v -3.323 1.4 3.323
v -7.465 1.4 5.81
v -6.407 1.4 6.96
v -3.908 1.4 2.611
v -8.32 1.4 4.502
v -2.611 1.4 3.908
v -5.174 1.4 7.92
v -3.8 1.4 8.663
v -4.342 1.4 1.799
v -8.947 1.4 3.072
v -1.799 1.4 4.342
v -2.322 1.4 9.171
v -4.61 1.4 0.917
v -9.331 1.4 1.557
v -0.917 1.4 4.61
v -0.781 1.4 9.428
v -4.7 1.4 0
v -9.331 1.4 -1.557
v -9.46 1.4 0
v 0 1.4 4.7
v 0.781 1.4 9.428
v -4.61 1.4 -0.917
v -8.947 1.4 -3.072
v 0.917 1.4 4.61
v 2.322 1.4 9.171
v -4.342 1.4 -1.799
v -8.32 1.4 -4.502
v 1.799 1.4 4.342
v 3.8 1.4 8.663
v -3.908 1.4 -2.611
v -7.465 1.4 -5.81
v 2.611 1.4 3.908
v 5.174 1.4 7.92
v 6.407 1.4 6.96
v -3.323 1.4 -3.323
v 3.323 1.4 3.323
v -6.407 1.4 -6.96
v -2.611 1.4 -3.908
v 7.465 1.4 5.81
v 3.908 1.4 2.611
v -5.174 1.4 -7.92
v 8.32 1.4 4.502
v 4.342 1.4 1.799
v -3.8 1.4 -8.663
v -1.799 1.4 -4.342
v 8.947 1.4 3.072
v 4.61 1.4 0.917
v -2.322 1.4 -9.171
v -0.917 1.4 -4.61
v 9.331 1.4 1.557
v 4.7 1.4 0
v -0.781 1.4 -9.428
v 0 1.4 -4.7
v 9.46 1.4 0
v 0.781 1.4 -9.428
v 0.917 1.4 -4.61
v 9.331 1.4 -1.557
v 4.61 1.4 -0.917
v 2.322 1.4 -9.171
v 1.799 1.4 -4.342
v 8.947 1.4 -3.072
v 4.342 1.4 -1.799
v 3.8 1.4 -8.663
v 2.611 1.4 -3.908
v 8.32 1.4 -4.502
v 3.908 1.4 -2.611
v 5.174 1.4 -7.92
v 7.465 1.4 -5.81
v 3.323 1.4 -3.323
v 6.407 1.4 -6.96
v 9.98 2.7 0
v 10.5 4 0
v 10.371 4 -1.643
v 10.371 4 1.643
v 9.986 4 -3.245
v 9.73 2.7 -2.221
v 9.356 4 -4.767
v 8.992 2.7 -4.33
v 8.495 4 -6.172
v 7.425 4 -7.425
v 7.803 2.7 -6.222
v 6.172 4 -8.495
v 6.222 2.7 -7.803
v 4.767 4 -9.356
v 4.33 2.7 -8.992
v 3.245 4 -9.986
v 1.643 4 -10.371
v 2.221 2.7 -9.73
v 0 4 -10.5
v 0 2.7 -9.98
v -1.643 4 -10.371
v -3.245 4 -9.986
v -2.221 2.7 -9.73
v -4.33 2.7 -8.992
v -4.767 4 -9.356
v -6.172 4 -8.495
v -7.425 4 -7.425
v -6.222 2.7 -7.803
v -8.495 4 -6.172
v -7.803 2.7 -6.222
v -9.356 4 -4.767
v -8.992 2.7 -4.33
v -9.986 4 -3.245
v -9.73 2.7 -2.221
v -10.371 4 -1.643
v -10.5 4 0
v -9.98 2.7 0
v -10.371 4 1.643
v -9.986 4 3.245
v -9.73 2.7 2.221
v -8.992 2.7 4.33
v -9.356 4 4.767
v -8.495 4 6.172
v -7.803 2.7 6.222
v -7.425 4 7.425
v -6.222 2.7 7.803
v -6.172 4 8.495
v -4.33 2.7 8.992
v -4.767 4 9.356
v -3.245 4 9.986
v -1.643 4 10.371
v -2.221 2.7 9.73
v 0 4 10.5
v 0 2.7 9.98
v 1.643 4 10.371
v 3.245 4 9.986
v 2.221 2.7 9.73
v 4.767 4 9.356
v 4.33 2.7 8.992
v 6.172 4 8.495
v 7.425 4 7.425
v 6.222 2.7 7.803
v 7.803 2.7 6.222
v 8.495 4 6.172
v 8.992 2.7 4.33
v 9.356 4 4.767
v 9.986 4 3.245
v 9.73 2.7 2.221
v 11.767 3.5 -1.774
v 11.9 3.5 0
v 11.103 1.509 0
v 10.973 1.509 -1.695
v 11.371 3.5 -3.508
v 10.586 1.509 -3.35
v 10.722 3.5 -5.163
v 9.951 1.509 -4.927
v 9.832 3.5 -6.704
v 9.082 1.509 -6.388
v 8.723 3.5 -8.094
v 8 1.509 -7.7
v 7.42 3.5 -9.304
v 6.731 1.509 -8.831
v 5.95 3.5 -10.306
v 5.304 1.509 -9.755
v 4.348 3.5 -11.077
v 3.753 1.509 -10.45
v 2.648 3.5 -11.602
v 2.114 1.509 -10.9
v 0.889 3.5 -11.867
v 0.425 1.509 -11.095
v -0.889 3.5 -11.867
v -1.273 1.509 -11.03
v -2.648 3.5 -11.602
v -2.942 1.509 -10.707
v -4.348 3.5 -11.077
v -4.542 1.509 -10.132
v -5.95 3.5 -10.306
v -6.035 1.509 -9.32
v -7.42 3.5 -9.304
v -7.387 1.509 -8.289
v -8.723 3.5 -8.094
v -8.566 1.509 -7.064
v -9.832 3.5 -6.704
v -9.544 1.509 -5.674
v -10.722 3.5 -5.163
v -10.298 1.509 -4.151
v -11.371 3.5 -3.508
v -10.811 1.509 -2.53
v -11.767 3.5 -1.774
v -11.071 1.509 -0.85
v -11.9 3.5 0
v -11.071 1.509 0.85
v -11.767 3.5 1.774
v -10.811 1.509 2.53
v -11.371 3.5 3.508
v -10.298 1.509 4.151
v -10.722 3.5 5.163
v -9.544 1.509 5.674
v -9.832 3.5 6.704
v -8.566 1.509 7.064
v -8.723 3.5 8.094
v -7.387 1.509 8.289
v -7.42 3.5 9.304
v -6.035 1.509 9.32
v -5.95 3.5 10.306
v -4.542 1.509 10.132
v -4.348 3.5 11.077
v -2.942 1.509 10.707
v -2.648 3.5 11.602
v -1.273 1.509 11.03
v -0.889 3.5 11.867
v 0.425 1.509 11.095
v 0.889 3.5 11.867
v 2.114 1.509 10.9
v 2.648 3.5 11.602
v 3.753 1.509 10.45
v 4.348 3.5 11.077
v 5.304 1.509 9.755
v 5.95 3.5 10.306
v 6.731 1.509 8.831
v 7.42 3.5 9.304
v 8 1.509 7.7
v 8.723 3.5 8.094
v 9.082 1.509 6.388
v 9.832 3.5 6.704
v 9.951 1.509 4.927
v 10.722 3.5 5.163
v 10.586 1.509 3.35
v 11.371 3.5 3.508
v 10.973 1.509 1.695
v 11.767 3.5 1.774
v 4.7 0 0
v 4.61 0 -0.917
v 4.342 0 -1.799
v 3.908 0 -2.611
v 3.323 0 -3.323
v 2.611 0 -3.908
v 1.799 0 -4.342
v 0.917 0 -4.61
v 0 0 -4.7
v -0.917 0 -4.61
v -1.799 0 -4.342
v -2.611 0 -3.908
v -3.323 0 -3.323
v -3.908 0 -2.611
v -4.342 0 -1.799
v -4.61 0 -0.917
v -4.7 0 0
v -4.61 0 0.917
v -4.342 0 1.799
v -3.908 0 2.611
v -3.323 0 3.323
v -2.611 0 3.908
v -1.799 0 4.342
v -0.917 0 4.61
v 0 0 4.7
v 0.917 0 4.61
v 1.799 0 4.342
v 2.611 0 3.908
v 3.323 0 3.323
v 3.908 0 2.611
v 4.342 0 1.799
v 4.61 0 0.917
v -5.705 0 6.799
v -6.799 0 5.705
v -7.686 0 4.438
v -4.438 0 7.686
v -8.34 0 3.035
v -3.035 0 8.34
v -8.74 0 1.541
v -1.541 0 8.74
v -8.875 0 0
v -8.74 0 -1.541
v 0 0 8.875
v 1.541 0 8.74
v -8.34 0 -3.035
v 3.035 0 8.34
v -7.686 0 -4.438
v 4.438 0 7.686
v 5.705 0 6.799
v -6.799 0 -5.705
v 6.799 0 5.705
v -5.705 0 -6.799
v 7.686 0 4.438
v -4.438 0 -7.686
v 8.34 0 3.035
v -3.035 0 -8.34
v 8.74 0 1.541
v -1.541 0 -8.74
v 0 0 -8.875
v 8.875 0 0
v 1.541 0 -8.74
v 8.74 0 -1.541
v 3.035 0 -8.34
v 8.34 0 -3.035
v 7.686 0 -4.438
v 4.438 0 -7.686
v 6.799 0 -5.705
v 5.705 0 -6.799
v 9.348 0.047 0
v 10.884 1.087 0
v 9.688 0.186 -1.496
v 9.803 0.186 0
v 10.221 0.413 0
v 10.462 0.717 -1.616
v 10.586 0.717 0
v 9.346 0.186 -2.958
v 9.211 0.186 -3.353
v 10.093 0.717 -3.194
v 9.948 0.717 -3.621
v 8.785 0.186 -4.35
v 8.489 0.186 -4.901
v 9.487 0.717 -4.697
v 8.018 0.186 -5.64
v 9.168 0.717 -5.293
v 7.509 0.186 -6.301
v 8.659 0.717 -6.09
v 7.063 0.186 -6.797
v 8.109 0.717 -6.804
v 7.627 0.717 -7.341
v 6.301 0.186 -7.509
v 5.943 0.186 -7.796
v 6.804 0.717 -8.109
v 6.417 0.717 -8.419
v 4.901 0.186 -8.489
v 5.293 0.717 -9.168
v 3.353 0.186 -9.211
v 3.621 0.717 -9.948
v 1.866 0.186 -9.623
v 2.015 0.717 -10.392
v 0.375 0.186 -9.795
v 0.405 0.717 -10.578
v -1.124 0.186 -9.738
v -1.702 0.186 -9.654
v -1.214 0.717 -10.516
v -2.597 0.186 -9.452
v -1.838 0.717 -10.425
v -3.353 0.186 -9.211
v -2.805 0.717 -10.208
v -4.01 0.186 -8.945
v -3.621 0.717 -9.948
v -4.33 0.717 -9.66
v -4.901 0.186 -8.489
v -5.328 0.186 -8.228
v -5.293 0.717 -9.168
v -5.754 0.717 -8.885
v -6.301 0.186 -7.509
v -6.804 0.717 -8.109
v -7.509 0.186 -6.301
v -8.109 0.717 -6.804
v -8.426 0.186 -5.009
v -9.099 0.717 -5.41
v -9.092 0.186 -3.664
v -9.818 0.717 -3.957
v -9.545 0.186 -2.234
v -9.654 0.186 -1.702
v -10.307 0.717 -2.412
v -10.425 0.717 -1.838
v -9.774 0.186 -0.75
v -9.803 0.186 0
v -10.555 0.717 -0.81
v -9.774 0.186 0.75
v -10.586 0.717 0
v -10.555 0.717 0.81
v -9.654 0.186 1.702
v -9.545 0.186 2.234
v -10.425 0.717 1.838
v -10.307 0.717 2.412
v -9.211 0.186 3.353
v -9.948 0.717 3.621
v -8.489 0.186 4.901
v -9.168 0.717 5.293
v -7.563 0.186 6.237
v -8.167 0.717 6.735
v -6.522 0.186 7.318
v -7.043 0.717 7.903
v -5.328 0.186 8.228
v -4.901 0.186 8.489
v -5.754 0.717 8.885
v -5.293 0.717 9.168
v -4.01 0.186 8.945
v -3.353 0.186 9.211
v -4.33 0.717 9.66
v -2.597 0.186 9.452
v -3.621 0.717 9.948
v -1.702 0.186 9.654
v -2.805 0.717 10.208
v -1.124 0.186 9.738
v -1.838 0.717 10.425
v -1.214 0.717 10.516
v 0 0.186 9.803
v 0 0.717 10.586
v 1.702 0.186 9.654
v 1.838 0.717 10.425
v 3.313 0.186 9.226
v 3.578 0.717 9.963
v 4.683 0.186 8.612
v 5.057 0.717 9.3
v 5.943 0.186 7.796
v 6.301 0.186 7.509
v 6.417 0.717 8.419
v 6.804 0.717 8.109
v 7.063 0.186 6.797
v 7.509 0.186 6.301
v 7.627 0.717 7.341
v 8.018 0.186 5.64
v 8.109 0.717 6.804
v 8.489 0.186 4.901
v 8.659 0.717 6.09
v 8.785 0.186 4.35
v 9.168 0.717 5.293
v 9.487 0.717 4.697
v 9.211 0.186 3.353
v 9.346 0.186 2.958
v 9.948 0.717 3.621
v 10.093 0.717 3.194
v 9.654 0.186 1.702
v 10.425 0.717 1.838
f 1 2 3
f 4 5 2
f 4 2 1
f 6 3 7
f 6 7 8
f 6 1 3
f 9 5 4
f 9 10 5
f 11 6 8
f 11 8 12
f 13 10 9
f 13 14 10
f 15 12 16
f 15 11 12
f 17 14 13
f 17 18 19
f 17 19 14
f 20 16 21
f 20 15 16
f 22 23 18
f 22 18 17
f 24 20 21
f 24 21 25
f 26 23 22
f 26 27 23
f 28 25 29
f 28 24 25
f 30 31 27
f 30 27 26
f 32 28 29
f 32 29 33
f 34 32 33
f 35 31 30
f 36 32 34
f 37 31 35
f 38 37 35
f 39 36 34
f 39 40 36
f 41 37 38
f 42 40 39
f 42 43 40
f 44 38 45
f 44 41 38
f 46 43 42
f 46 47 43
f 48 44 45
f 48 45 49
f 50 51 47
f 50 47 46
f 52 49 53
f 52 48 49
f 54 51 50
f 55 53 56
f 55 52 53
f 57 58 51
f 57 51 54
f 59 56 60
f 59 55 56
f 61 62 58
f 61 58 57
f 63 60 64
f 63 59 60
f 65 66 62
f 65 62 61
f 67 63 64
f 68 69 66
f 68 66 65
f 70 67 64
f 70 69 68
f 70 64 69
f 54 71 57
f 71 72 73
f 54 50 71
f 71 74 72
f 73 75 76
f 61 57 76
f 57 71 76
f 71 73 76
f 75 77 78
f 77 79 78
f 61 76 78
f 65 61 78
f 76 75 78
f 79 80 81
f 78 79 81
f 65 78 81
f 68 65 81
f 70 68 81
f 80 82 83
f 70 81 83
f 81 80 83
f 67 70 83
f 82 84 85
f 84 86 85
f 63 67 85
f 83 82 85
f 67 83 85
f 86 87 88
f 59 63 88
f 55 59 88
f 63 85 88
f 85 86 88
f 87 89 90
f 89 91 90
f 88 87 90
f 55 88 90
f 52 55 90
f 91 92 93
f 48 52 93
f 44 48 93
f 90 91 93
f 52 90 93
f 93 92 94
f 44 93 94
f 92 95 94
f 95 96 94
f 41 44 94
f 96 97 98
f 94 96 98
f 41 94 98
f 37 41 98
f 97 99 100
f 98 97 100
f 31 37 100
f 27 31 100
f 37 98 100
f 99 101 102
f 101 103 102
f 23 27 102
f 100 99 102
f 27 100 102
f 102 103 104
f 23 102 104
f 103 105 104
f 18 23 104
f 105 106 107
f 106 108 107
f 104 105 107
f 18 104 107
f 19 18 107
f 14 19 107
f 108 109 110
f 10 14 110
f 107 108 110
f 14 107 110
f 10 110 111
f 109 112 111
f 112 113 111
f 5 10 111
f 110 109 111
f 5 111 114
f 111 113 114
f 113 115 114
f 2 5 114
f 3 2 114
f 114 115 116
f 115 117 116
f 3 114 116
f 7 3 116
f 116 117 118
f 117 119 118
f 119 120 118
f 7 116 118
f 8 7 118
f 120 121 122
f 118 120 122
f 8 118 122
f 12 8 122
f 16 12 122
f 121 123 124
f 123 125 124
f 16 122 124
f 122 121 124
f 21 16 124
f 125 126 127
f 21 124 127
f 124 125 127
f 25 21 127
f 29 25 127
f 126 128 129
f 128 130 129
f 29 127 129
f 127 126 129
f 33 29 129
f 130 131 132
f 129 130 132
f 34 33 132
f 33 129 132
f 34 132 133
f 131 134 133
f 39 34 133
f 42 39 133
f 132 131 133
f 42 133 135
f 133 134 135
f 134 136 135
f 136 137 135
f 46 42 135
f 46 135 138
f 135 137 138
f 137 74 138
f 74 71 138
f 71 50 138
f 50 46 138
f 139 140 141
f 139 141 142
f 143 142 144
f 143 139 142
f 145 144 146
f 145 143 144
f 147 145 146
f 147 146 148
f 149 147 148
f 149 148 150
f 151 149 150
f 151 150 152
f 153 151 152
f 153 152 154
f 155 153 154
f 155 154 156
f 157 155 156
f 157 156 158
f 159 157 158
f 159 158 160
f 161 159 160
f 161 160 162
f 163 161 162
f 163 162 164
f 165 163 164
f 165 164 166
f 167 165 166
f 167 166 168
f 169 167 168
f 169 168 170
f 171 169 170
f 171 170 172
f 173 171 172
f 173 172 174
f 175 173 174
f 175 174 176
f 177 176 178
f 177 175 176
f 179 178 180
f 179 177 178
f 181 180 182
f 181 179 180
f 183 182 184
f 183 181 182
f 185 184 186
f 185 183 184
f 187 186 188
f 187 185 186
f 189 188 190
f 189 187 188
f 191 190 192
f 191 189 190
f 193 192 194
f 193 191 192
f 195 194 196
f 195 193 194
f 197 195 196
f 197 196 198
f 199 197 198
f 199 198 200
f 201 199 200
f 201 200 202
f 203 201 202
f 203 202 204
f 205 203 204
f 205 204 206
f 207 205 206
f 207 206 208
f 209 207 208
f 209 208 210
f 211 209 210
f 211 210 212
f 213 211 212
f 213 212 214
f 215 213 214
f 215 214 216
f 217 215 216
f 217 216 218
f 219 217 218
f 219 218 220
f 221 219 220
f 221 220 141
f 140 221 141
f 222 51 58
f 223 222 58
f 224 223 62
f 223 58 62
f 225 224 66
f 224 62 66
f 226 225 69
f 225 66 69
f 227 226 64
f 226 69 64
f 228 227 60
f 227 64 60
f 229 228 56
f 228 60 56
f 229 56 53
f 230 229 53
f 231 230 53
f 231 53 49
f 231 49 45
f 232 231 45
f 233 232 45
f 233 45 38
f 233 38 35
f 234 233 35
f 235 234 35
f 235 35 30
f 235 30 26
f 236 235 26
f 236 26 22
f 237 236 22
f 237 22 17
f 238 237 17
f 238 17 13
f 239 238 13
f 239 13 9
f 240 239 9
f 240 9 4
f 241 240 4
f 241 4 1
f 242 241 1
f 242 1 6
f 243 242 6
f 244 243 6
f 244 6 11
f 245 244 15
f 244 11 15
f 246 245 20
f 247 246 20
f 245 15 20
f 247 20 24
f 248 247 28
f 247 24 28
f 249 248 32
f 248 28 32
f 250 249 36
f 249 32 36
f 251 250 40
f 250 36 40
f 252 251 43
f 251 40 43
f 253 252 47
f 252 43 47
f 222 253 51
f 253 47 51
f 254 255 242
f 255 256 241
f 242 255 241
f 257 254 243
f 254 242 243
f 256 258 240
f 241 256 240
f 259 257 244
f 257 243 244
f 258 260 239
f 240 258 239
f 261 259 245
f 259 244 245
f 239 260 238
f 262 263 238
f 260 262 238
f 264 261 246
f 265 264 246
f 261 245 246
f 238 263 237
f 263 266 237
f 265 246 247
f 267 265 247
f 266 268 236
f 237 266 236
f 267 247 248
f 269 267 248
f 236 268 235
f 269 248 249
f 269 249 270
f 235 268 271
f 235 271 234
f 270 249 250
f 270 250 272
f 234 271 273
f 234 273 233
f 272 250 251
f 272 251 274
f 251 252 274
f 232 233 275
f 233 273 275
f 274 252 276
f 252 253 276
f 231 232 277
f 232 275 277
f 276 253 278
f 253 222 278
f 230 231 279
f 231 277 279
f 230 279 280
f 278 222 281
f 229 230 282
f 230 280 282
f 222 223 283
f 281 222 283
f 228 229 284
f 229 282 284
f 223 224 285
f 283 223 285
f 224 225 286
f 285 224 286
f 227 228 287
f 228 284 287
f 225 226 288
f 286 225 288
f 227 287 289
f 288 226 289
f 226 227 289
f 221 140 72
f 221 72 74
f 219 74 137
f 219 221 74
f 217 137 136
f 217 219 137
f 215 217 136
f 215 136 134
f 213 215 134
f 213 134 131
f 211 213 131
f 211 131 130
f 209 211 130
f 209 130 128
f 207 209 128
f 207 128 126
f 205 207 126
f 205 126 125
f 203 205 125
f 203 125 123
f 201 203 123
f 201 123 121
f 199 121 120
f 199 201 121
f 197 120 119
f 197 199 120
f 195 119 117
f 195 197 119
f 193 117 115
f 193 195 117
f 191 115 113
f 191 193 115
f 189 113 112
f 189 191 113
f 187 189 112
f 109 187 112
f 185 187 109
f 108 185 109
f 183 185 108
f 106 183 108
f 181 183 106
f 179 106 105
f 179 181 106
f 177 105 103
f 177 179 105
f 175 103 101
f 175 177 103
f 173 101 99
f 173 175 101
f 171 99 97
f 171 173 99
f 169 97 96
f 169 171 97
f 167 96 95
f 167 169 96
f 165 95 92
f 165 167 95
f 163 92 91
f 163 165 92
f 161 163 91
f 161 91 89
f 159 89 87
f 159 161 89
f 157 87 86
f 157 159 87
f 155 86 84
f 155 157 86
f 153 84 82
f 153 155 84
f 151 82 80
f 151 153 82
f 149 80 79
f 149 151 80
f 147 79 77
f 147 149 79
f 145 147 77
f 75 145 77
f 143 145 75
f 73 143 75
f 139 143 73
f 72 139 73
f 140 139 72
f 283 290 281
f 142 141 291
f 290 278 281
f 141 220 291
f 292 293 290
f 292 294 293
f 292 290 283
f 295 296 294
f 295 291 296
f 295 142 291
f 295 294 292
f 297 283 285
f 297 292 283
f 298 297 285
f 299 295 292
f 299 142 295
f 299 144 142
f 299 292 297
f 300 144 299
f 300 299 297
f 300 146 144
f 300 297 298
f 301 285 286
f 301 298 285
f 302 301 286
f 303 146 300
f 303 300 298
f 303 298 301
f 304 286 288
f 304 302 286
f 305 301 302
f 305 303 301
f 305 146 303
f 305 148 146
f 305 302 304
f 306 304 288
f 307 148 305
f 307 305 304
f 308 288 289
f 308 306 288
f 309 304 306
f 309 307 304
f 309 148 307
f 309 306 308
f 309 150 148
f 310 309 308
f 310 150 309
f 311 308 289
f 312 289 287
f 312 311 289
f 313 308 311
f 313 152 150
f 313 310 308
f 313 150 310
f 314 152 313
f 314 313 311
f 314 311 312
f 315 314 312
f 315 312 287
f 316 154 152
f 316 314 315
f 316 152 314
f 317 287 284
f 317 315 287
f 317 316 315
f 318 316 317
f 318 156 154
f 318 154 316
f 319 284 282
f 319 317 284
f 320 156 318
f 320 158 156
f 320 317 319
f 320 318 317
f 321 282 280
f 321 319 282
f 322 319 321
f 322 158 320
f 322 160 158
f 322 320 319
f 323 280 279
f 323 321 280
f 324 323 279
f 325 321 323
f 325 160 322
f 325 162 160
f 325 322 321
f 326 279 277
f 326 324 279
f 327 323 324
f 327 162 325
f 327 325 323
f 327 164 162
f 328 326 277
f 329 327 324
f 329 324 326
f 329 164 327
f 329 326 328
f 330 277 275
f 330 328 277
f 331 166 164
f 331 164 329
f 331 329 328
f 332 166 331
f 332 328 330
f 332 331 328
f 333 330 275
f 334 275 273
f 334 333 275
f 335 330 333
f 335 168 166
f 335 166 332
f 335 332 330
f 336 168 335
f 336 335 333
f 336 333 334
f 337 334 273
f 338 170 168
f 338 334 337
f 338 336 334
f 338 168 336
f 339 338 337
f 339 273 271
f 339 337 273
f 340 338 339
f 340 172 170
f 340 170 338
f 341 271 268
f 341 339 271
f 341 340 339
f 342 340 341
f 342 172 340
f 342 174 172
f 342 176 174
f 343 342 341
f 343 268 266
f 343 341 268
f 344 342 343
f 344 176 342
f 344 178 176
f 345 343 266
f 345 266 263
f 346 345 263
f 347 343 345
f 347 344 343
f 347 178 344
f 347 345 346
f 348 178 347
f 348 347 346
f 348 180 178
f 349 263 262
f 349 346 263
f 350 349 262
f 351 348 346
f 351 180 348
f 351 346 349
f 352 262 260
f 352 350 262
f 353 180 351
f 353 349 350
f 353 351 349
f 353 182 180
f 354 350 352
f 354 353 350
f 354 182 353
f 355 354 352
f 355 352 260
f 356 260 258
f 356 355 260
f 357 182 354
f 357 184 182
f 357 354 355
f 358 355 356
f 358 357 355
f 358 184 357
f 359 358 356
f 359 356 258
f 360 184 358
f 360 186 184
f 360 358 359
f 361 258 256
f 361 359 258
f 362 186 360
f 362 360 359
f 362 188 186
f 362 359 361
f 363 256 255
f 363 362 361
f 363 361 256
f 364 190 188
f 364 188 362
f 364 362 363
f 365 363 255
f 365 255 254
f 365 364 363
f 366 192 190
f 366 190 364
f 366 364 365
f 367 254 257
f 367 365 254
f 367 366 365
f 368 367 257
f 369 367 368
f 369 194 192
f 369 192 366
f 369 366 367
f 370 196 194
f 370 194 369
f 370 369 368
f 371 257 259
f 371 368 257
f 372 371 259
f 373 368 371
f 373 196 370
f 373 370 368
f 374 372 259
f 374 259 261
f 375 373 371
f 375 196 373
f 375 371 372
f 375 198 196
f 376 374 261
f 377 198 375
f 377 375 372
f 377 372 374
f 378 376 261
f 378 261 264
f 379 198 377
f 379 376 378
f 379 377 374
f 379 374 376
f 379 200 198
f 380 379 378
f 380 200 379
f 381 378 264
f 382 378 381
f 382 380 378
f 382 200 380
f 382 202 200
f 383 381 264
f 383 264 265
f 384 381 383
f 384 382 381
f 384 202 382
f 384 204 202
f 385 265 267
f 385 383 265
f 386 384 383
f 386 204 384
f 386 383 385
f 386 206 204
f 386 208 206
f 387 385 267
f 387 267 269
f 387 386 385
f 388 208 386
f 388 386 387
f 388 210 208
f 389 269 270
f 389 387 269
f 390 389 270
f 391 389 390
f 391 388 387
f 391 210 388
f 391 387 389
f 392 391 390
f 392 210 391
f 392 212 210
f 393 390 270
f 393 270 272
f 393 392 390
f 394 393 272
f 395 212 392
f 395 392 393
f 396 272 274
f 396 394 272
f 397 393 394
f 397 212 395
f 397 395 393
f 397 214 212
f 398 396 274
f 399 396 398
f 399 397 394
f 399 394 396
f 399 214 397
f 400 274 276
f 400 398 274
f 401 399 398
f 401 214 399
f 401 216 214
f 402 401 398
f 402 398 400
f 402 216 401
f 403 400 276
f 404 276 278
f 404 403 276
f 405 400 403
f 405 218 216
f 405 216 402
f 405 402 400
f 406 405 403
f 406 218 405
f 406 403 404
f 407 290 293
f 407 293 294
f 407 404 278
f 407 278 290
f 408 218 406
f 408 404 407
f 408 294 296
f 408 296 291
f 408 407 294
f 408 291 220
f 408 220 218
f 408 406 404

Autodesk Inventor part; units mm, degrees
ref_plane "YZ Plane" through (0, 0, 0) normal (1, 0, 0) x (0, 1, 0)
ref_plane "XZ Plane" through (0, 0, 0) normal (0, 1, 0) x (-1, 0, 0)
ref_plane "XY Plane" through (0, 0, 0) normal (0, 0, 1) x (1, 0, 0)
sketch "Sketch1" plane through (0, 0, 0) normal (0, 0, 1) x (1, 0, 0)
  line L0 (11.9, 0) -> (11.9, 3.5) construction
  line L1 (11.9, 3.5) -> (10.5, 3.5) construction
  line L2 (0, 0) -> (0, 1.4)
  line L3 (10.5, 3.5) -> (10.5, 4) construction
  line L4 (11.9, 3.5) -> (10.5, 4)
  line L5 (0, 0) -> (10.5, 0)
  line L6 (10.5, 0) -> (11.9, 3.5)
  line L7 (10.5, 4) -> (9.46, 1.4)
  line L8 (0, 1.4) -> (9.46, 1.4)
  dimension "d0" = 11.9
  dimension "d1" = 3.5
  dimension "d2" = 1.4
  dimension "d3" = 0.5
  dimension "d4" = 1.4
revolve "Revolution1" add sketch "Sketch1" angle 360 about axis through (0, 0, 0) along (0, 1, 0)
sketch "Sketch2" plane through (0, 1.4, 0) normal (0, 1, 0) x (1, 0, 0)
  circle A0 centre (0, 0) radius 4.7
  dimension "d6" = 9.4
extrude "Extrusion1" cut sketch "Sketch2" against normal through all
fillet "Fillet1" radius 2.4 1 edges at (-10.5, 0, 0)
properties part number "TopBushingWasher" material "Aluminum"
